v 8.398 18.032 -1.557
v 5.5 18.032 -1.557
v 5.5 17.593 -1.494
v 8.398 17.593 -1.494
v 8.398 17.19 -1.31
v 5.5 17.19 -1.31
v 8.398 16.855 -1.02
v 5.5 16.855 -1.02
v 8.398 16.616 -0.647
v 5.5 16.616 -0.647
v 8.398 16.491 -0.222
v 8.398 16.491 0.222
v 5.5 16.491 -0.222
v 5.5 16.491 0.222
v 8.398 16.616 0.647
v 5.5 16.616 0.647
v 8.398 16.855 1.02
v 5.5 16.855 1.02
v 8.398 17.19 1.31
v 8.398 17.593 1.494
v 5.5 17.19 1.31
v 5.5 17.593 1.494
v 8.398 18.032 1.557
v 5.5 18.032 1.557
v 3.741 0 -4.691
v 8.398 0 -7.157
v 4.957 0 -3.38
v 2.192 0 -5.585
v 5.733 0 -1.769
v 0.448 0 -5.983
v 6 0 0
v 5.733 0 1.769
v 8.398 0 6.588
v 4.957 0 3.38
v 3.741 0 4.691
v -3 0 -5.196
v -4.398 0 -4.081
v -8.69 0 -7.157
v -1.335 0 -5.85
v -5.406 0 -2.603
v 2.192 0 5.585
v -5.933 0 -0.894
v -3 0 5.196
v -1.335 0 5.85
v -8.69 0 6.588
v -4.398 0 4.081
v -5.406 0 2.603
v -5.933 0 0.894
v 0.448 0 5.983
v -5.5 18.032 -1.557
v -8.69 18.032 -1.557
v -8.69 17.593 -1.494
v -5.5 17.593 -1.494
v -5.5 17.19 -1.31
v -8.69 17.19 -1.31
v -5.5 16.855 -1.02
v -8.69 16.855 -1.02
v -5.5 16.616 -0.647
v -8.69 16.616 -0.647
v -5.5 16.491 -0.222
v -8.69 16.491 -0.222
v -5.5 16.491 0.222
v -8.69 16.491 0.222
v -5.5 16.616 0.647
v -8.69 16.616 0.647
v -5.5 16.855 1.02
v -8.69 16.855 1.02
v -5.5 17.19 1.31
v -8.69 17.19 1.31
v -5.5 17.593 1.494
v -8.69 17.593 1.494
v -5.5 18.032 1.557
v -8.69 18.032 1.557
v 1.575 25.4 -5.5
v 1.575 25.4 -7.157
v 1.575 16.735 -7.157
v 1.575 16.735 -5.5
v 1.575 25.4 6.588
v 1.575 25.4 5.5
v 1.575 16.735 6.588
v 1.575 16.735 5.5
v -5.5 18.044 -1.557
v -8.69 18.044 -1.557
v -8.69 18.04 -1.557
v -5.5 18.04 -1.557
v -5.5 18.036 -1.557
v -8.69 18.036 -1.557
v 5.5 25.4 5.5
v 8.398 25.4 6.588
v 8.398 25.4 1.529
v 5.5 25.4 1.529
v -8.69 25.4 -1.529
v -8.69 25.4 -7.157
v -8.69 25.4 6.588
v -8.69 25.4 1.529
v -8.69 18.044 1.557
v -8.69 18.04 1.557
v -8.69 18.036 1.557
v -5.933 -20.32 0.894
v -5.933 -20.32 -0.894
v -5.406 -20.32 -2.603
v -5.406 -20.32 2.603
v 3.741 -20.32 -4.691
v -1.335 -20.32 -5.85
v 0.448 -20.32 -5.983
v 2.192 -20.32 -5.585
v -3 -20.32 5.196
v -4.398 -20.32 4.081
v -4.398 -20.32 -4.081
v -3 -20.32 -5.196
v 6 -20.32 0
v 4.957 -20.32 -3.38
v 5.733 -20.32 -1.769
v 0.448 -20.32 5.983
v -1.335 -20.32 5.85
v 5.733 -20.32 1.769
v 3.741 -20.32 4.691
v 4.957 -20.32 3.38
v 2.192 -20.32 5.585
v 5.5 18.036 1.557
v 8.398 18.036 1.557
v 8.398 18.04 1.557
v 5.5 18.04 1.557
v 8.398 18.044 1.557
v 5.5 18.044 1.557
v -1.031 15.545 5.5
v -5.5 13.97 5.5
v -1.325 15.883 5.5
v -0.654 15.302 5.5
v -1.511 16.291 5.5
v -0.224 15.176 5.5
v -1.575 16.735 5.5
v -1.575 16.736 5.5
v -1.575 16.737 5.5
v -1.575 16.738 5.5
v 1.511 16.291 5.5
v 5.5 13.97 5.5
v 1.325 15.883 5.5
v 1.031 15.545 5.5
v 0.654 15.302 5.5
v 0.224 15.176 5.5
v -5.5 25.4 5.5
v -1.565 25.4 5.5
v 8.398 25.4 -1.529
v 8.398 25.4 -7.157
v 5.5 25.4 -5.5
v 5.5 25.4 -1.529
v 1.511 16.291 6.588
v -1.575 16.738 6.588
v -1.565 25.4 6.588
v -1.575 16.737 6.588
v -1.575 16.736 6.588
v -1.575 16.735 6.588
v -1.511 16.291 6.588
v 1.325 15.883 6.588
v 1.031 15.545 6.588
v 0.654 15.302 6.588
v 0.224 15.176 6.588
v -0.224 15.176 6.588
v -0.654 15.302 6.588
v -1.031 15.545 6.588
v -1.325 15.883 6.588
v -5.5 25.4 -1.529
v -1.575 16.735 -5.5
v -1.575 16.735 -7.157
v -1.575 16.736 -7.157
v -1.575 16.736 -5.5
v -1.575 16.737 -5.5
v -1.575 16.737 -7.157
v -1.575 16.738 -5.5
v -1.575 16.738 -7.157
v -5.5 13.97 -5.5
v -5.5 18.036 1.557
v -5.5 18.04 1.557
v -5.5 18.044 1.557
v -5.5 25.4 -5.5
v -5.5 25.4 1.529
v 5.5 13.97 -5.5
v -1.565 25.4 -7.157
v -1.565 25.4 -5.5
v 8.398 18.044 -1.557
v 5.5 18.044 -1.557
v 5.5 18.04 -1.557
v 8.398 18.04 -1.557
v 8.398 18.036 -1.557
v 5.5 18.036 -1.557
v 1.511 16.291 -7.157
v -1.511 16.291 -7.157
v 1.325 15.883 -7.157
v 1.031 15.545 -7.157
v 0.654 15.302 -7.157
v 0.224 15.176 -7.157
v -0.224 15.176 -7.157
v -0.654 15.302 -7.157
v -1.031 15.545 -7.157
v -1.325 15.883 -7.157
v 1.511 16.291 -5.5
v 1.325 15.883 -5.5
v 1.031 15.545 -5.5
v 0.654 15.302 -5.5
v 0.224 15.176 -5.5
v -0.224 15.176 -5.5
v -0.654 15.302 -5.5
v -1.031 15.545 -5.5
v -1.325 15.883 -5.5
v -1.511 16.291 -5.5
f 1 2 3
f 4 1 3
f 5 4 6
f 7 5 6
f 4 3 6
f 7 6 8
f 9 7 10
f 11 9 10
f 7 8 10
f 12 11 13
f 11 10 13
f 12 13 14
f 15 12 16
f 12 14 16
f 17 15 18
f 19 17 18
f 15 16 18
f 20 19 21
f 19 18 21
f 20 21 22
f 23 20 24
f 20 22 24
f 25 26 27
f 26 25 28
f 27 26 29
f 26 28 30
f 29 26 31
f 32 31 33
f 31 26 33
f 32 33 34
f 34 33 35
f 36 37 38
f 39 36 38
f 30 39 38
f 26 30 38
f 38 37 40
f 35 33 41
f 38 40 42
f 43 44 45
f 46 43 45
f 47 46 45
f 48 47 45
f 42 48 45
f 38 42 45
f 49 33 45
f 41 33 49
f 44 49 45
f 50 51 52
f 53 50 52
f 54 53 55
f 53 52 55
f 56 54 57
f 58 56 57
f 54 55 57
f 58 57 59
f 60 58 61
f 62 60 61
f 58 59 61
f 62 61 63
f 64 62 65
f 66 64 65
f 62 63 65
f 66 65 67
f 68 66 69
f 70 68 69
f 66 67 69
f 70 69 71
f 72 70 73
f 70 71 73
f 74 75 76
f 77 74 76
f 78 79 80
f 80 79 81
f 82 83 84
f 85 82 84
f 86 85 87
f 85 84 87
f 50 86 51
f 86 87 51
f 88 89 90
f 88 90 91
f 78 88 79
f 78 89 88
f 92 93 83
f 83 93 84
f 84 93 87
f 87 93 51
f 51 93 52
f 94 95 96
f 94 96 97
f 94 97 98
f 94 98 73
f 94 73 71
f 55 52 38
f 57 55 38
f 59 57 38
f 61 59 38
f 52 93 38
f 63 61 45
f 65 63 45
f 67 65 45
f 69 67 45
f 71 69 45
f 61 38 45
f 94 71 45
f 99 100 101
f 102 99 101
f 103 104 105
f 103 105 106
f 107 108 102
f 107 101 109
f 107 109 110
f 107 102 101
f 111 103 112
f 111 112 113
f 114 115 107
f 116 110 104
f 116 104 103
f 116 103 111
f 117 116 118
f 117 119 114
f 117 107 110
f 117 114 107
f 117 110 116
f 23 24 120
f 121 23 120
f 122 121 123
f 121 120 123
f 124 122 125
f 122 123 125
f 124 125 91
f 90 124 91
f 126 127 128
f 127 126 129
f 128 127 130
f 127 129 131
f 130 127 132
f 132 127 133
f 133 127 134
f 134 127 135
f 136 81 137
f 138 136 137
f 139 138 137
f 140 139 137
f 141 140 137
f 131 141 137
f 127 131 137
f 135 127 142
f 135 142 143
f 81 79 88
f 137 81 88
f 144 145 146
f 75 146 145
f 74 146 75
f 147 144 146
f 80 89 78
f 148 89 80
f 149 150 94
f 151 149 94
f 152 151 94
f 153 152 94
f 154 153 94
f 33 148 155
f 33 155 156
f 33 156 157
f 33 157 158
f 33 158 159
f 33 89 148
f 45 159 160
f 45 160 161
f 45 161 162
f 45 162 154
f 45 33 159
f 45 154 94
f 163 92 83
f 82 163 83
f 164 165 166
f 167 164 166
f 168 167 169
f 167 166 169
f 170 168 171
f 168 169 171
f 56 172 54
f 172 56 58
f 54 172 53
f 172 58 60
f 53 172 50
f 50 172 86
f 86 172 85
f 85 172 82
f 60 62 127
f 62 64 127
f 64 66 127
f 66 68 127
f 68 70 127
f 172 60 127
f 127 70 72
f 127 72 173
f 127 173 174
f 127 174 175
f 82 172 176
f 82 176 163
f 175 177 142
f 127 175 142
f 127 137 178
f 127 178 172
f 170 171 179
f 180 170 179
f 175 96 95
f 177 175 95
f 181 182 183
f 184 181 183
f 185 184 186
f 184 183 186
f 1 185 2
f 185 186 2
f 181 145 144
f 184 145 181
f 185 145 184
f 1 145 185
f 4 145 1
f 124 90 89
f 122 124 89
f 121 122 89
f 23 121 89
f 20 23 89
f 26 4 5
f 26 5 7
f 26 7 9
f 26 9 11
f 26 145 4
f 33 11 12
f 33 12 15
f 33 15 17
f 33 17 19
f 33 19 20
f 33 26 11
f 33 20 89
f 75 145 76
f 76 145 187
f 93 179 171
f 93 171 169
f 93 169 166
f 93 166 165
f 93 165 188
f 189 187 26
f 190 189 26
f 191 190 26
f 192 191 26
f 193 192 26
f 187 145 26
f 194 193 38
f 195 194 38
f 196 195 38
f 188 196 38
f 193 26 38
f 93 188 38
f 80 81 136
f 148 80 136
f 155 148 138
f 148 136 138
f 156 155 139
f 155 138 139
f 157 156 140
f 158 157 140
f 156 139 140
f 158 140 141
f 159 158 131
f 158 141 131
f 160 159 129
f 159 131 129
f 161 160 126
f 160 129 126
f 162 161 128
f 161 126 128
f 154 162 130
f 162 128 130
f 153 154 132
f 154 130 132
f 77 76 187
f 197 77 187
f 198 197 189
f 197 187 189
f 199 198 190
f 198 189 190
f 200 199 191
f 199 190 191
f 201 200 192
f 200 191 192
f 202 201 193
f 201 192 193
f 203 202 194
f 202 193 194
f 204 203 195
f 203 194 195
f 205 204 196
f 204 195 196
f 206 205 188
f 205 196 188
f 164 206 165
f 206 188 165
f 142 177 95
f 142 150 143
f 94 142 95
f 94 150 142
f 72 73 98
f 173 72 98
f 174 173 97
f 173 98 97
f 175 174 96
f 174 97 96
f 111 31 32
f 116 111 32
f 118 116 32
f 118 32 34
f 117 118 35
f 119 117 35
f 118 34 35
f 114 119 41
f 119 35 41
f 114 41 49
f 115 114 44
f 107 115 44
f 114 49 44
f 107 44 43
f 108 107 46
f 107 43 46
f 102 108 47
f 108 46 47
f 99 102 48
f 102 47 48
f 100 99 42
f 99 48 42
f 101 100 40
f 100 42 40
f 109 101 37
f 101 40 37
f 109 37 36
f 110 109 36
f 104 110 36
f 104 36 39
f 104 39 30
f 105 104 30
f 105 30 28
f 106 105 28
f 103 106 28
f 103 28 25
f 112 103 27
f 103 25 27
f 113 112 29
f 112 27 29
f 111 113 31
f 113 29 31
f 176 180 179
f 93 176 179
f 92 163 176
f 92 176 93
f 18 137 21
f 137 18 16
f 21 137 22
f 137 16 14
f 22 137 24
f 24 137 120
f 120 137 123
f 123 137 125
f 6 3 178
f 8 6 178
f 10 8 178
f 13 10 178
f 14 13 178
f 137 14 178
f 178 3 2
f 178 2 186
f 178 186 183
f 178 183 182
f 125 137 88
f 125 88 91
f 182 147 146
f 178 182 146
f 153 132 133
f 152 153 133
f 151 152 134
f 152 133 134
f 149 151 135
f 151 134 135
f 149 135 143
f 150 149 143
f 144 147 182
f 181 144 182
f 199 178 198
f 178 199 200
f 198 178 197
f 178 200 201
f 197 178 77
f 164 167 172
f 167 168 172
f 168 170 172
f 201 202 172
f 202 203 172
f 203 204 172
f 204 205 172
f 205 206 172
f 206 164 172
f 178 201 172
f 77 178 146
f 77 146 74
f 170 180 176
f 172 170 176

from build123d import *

# Parameters (mm, degrees)
F0_R     = 6
F1_DEPTH = 20.32
F2_W     = 17.0879438519
F2_H     = 13.7446504086
F3_DEPTH = 25.4
F5_DEPTH = 11.43
F7_DEPTH = 25.4
F9_DEPTH = 25.4


# Not quite as in the source:
# - a feature names something its author has since deleted; it is built from what else it names


with BuildPart() as f1:
    # F0 (on Front) → F1 (new body)
    with BuildSketch(Plane.XZ):
        Circle(F0_R)
    extrude(amount=F1_DEPTH)

    # F2 (on face) → F3 (join)
    with BuildSketch(Plane(origin=(0, 0, 0), x_dir=(-1, 0, 0), z_dir=(0, 1, 0))):
        with Locations((0.1456169412, -0.2847756259)):
            Rectangle(F2_W, F2_H)
    extrude(amount=F3_DEPTH)

    # F4 (on face) → F5 (cut)
    with BuildSketch(Plane(origin=(0, 25.4, 0), x_dir=(-1, 0, 0), z_dir=(0, 1, 0))):
        Polygon((5.5, 5.5), (0, 5.5), (-5.5, 5.5), (-5.5, -5.5), (5.5, -5.5), align=None)
    extrude(amount=-F5_DEPTH, mode=Mode.SUBTRACT)

    # F6 (on face) → F7 (cut)
    with BuildSketch(Plane(origin=(0, 0, -7.1571008302), x_dir=(1, 0, 0), z_dir=(0, 0, -1))):
        with BuildLine():
            Line((1.5748, -25.4), (1.5748, -16.734668985))
            ThreePointArc((1.5748, -16.734668985), (0, -15.159868985), (-1.5748, -16.734668985))
            ThreePointArc((-1.5748, -16.734668985), (-1.574798986, -16.7364561088), (-1.5747959439, -16.7382432303))
            Line((-1.5747959439, -16.7382432303), (-1.5649663519, -25.4))
            Line((-1.5649663519, -25.4), (1.5748, -25.4))
        make_face()
    extrude(amount=-F7_DEPTH, mode=Mode.SUBTRACT)

    # F8 (on face) → F9 (cut)
    with BuildSketch(Plane(origin=(-8.6895888671, 0, 0), x_dir=(0, -1, 0), z_dir=(-1, 0, 0))):
        with BuildLine():
            Line((-25.4, -1.5290330871), (-18.0435866661, -1.5568010835))
            ThreePointArc((-18.0435866661, -1.5568010835), (-18.0377102216, -1.5568343561), (-18.0318336934, -1.556845447))
            ThreePointArc((-18.0318336934, -1.556845447), (-16.4749882464, 0), (-18.0318336934, 1.556845447))
            ThreePointArc((-18.0318336934, 1.556845447), (-18.0377102216, 1.5568343561), (-18.0435866661, 1.5568010835))
            Line((-18.0435866661, 1.5568010835), (-25.4, 1.5290330871))
            Line((-25.4, 1.5290330871), (-25.4, -1.5290330871))
        make_face()
    extrude(amount=-F9_DEPTH, mode=Mode.SUBTRACT)


solid = f1.part
